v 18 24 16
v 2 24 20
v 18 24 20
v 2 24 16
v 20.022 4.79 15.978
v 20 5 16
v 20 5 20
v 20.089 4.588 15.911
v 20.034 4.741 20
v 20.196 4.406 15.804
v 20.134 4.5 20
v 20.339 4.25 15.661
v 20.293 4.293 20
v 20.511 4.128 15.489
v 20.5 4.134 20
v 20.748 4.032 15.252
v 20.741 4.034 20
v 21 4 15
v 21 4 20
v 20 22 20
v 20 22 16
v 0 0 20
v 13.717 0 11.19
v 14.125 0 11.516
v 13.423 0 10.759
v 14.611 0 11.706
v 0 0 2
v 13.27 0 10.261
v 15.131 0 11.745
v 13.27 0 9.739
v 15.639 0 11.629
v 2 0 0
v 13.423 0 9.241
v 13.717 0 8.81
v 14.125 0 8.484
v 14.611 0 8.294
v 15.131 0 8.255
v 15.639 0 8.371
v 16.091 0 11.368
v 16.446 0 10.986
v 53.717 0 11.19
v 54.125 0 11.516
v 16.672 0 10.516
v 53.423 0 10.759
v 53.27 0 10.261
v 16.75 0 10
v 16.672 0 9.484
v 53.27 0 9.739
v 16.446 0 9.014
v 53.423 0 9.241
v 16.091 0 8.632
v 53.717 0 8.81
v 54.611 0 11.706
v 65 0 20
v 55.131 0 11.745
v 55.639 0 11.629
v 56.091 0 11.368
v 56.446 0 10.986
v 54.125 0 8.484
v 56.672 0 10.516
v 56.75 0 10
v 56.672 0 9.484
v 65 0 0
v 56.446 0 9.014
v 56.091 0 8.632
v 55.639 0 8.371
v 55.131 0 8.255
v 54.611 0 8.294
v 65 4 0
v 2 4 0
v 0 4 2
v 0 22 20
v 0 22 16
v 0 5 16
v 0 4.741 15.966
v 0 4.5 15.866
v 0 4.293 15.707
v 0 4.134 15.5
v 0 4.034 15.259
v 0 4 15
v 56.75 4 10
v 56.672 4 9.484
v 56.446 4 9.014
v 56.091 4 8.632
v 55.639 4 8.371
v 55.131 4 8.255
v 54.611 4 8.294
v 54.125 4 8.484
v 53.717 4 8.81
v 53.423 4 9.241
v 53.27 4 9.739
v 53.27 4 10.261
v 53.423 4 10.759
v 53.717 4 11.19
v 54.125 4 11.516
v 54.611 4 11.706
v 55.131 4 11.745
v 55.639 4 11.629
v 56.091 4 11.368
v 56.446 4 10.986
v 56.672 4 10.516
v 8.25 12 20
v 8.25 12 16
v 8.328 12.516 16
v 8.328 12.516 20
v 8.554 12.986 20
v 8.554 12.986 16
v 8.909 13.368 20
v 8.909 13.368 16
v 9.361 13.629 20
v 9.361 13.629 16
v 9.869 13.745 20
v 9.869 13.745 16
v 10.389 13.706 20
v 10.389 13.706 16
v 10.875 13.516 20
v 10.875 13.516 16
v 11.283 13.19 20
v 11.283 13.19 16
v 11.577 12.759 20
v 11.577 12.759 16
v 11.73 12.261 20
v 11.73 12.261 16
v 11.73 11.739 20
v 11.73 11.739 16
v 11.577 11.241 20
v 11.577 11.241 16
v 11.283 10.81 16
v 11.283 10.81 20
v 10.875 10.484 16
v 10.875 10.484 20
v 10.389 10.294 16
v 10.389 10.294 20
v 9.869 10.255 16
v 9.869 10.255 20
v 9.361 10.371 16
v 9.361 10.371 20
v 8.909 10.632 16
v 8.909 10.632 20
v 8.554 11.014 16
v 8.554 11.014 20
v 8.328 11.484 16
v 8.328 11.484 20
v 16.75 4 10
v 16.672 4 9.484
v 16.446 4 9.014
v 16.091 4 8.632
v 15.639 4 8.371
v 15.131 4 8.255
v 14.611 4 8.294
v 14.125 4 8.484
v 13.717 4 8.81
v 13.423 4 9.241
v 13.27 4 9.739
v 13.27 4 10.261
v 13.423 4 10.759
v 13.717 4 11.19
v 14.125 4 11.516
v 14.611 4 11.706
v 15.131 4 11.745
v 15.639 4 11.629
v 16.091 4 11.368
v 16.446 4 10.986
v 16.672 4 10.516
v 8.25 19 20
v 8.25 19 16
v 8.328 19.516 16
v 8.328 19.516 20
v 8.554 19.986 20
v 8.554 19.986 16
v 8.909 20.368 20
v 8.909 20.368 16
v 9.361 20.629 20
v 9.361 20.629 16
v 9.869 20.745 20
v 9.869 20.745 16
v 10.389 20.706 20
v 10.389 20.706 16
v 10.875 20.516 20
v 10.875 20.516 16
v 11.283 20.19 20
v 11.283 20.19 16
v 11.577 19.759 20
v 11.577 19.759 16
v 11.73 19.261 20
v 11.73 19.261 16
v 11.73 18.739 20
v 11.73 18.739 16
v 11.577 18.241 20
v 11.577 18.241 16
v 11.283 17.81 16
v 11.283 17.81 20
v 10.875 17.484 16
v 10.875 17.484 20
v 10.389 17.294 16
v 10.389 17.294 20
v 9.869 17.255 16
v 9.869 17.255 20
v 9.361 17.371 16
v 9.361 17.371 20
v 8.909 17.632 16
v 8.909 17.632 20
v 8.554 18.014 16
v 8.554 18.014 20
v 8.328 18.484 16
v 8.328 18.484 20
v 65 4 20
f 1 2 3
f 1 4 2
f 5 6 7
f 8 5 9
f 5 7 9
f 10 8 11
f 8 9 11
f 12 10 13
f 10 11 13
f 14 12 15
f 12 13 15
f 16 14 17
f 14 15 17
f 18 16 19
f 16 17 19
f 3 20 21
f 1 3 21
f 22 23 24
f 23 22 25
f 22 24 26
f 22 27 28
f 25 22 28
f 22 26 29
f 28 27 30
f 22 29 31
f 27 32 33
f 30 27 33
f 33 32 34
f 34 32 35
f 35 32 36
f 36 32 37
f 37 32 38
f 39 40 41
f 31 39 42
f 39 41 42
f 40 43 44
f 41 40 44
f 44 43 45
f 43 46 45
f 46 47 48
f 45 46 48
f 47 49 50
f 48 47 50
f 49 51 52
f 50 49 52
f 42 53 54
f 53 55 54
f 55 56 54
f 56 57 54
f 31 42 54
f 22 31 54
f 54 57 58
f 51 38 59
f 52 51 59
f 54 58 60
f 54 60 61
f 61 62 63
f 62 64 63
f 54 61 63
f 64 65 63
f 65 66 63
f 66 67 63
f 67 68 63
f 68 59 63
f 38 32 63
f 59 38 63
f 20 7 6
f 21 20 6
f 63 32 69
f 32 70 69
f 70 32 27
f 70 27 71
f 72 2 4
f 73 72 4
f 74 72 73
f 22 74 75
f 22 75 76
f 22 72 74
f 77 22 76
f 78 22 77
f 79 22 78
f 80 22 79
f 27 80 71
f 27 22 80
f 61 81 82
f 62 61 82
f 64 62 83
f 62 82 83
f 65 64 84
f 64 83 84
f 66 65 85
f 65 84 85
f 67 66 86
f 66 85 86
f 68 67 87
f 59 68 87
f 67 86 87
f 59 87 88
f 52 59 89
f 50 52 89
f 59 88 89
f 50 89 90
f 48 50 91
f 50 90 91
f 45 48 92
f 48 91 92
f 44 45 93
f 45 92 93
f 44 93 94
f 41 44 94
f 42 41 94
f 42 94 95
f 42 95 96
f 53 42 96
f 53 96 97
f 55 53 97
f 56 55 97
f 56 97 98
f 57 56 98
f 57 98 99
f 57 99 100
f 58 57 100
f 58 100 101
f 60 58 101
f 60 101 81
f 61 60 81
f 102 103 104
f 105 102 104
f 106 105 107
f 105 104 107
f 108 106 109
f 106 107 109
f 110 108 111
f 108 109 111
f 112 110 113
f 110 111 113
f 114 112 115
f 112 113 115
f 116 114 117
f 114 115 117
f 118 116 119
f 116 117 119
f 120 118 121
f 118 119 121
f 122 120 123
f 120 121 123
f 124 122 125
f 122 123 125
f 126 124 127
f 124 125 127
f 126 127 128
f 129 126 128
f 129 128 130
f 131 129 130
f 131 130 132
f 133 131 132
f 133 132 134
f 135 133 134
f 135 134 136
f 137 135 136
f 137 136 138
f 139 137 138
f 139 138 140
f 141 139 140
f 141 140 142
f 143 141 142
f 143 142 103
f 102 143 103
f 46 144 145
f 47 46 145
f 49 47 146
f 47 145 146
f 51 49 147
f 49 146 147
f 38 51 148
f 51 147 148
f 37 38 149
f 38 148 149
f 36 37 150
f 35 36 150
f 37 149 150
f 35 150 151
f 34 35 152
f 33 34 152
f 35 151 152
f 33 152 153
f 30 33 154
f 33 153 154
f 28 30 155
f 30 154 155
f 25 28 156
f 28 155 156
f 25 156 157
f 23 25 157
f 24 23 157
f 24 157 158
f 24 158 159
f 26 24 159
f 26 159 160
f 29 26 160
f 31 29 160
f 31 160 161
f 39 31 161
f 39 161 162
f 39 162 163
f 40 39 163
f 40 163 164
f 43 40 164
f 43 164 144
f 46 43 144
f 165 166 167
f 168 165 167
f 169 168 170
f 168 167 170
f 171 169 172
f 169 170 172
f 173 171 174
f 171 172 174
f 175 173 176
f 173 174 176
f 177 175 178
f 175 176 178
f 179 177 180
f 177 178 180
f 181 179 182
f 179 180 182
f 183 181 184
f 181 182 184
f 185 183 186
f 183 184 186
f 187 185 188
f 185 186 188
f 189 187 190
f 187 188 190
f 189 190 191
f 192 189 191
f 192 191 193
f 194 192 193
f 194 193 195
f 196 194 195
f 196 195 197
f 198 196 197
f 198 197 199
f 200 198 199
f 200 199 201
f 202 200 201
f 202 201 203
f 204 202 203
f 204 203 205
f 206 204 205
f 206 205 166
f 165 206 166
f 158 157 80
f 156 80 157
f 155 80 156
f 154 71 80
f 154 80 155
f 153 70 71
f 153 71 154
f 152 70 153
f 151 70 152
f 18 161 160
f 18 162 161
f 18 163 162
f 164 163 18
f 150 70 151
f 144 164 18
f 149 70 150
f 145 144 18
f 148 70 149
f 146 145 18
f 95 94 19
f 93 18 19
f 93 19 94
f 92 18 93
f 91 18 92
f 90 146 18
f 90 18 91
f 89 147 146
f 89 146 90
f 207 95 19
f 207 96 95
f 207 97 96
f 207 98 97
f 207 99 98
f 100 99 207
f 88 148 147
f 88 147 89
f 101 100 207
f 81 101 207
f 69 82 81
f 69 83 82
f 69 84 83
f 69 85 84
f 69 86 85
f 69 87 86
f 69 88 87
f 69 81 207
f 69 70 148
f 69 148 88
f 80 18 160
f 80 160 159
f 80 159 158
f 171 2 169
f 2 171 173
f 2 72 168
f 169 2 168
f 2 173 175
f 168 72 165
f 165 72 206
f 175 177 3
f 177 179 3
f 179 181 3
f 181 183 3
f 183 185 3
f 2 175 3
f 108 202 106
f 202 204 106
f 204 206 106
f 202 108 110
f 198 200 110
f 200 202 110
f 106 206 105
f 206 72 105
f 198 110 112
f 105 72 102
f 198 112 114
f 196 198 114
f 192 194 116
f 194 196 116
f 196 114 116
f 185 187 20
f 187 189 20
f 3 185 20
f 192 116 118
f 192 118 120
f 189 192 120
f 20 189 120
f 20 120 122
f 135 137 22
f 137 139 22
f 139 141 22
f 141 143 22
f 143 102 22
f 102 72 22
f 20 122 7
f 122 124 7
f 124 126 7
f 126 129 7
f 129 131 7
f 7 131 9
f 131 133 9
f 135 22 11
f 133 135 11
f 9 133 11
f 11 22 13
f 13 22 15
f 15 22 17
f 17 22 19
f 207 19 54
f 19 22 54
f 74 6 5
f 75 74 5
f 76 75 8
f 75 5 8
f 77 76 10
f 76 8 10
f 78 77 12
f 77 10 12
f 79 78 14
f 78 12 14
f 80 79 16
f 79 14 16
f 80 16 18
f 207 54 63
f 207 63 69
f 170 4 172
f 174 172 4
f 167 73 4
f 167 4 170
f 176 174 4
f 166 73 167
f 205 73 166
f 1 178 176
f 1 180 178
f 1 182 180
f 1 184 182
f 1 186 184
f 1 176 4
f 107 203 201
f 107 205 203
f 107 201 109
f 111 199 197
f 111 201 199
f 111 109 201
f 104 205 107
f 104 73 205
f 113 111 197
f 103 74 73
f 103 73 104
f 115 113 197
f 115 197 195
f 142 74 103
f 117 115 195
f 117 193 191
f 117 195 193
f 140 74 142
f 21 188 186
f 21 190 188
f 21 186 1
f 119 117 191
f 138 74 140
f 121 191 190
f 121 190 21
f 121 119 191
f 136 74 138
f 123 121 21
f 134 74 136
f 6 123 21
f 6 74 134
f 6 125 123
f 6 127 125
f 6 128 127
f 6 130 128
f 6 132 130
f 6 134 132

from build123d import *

# Parameters (mm, degrees)
SCHIZZO1_W                   = 65
SCHIZZO1_H                   = 4
ESTRUSIONE_ESTRUSIONE1_DEPTH = 20
SCHIZZO2_W                   = 20
SCHIZZO2_H                   = 4
ESTRUSIONE_ESTRUSIONE2_DEPTH = 20
TAGLIO_ESTRUSIONE1_REACH     = 6
SCHIZZO6_R                   = 1.75
TAGLIO_ESTRUSIONE2_REACH     = 6
SCHIZZO7_R                   = 1.75
RACCORDO1_R                  = 1
RACCORDO2_R                  = 1
SMUSSO1_SIZE                 = 2
SMUSSO3_SIZE                 = 2


with BuildPart() as part:
    # Schizzo1 → Estrusione-Estrusione1 (new body)
    with BuildSketch(Plane.XY):
        with Locations((32.5, 2)):
            Rectangle(SCHIZZO1_W, SCHIZZO1_H)
    extrude(amount=ESTRUSIONE_ESTRUSIONE1_DEPTH)

    # Schizzo2 → Estrusione-Estrusione2 (add)
    with BuildSketch(Plane(origin=(0, 4, 0), x_dir=(1, 0, 0), z_dir=(0, 1, 0))):
        with Locations((10, -18)):
            Rectangle(SCHIZZO2_W, SCHIZZO2_H)
    extrude(amount=ESTRUSIONE_ESTRUSIONE2_DEPTH)

    # Schizzo6 → Taglio-Estrusione1 (cut, up to next)
    with BuildSketch(Plane(origin=(0, 4, 0), x_dir=(1, 0, 0), z_dir=(0, 1, 0)), mode=Mode.PRIVATE) as taglio_estrusione1_sk1:
        with Locations((15, -10)):
            Circle(SCHIZZO6_R)
    taglio_estrusione1_tool1 = extrude(taglio_estrusione1_sk1.sketch, amount=-TAGLIO_ESTRUSIONE1_REACH, mode=Mode.PRIVATE) & part.part
    add(taglio_estrusione1_tool1.solids().sort_by_distance((15, 4, 10))[0], mode=Mode.SUBTRACT)
    # Schizzo6 → Taglio-Estrusione1 (cut, up to next)
    with BuildSketch(Plane(origin=(0, 4, 0), x_dir=(1, 0, 0), z_dir=(0, 1, 0)), mode=Mode.PRIVATE) as taglio_estrusione1_sk2:
        with Locations((55, -10)):
            Circle(SCHIZZO6_R)
    taglio_estrusione1_tool2 = extrude(taglio_estrusione1_sk2.sketch, amount=-TAGLIO_ESTRUSIONE1_REACH, mode=Mode.PRIVATE) & part.part
    add(taglio_estrusione1_tool2.solids().sort_by_distance((55, 4, 10))[0], mode=Mode.SUBTRACT)

    # Schizzo7 → Taglio-Estrusione2 (cut, up to next)
    with BuildSketch(Plane(origin=(0, 0, 16), x_dir=(-1, 0, 0), z_dir=(0, 0, -1)), mode=Mode.PRIVATE) as taglio_estrusione2_sk1:
        with Locations((-10, 19)):
            Circle(SCHIZZO7_R)
    taglio_estrusione2_tool1 = extrude(taglio_estrusione2_sk1.sketch, amount=-TAGLIO_ESTRUSIONE2_REACH, mode=Mode.PRIVATE) & part.part
    add(taglio_estrusione2_tool1.solids().sort_by_distance((10, 19, 16))[0], mode=Mode.SUBTRACT)
    # Schizzo7 → Taglio-Estrusione2 (cut, up to next)
    with BuildSketch(Plane(origin=(0, 0, 16), x_dir=(-1, 0, 0), z_dir=(0, 0, -1)), mode=Mode.PRIVATE) as taglio_estrusione2_sk2:
        with Locations((-10, 12)):
            Circle(SCHIZZO7_R)
    taglio_estrusione2_tool2 = extrude(taglio_estrusione2_sk2.sketch, amount=-TAGLIO_ESTRUSIONE2_REACH, mode=Mode.PRIVATE) & part.part
    add(taglio_estrusione2_tool2.solids().sort_by_distance((10, 12, 16))[0], mode=Mode.SUBTRACT)

    # Raccordo1
    raccordo1_edges = [part.edges().sort_by_distance(p)[0] for p in [
        (10, 4, 16),
    ]]
    fillet(raccordo1_edges, radius=RACCORDO1_R)

    # Raccordo2
    raccordo2_edges = [part.edges().sort_by_distance(p)[0] for p in [
        (20, 4, 18),
    ]]
    fillet(raccordo2_edges, radius=RACCORDO2_R)

    # Smusso1
    smusso1_edges = [part.edges().sort_by_distance(p)[0] for p in [
        (0, 24, 18),
        (20, 24, 18),
    ]]
    chamfer(smusso1_edges, length=SMUSSO1_SIZE)

    # Smusso3
    smusso3_edges = [part.edges().sort_by_distance(p)[0] for p in [
        (0, 2, 0),
    ]]
    chamfer(smusso3_edges, length=SMUSSO3_SIZE)


solid = part.part
